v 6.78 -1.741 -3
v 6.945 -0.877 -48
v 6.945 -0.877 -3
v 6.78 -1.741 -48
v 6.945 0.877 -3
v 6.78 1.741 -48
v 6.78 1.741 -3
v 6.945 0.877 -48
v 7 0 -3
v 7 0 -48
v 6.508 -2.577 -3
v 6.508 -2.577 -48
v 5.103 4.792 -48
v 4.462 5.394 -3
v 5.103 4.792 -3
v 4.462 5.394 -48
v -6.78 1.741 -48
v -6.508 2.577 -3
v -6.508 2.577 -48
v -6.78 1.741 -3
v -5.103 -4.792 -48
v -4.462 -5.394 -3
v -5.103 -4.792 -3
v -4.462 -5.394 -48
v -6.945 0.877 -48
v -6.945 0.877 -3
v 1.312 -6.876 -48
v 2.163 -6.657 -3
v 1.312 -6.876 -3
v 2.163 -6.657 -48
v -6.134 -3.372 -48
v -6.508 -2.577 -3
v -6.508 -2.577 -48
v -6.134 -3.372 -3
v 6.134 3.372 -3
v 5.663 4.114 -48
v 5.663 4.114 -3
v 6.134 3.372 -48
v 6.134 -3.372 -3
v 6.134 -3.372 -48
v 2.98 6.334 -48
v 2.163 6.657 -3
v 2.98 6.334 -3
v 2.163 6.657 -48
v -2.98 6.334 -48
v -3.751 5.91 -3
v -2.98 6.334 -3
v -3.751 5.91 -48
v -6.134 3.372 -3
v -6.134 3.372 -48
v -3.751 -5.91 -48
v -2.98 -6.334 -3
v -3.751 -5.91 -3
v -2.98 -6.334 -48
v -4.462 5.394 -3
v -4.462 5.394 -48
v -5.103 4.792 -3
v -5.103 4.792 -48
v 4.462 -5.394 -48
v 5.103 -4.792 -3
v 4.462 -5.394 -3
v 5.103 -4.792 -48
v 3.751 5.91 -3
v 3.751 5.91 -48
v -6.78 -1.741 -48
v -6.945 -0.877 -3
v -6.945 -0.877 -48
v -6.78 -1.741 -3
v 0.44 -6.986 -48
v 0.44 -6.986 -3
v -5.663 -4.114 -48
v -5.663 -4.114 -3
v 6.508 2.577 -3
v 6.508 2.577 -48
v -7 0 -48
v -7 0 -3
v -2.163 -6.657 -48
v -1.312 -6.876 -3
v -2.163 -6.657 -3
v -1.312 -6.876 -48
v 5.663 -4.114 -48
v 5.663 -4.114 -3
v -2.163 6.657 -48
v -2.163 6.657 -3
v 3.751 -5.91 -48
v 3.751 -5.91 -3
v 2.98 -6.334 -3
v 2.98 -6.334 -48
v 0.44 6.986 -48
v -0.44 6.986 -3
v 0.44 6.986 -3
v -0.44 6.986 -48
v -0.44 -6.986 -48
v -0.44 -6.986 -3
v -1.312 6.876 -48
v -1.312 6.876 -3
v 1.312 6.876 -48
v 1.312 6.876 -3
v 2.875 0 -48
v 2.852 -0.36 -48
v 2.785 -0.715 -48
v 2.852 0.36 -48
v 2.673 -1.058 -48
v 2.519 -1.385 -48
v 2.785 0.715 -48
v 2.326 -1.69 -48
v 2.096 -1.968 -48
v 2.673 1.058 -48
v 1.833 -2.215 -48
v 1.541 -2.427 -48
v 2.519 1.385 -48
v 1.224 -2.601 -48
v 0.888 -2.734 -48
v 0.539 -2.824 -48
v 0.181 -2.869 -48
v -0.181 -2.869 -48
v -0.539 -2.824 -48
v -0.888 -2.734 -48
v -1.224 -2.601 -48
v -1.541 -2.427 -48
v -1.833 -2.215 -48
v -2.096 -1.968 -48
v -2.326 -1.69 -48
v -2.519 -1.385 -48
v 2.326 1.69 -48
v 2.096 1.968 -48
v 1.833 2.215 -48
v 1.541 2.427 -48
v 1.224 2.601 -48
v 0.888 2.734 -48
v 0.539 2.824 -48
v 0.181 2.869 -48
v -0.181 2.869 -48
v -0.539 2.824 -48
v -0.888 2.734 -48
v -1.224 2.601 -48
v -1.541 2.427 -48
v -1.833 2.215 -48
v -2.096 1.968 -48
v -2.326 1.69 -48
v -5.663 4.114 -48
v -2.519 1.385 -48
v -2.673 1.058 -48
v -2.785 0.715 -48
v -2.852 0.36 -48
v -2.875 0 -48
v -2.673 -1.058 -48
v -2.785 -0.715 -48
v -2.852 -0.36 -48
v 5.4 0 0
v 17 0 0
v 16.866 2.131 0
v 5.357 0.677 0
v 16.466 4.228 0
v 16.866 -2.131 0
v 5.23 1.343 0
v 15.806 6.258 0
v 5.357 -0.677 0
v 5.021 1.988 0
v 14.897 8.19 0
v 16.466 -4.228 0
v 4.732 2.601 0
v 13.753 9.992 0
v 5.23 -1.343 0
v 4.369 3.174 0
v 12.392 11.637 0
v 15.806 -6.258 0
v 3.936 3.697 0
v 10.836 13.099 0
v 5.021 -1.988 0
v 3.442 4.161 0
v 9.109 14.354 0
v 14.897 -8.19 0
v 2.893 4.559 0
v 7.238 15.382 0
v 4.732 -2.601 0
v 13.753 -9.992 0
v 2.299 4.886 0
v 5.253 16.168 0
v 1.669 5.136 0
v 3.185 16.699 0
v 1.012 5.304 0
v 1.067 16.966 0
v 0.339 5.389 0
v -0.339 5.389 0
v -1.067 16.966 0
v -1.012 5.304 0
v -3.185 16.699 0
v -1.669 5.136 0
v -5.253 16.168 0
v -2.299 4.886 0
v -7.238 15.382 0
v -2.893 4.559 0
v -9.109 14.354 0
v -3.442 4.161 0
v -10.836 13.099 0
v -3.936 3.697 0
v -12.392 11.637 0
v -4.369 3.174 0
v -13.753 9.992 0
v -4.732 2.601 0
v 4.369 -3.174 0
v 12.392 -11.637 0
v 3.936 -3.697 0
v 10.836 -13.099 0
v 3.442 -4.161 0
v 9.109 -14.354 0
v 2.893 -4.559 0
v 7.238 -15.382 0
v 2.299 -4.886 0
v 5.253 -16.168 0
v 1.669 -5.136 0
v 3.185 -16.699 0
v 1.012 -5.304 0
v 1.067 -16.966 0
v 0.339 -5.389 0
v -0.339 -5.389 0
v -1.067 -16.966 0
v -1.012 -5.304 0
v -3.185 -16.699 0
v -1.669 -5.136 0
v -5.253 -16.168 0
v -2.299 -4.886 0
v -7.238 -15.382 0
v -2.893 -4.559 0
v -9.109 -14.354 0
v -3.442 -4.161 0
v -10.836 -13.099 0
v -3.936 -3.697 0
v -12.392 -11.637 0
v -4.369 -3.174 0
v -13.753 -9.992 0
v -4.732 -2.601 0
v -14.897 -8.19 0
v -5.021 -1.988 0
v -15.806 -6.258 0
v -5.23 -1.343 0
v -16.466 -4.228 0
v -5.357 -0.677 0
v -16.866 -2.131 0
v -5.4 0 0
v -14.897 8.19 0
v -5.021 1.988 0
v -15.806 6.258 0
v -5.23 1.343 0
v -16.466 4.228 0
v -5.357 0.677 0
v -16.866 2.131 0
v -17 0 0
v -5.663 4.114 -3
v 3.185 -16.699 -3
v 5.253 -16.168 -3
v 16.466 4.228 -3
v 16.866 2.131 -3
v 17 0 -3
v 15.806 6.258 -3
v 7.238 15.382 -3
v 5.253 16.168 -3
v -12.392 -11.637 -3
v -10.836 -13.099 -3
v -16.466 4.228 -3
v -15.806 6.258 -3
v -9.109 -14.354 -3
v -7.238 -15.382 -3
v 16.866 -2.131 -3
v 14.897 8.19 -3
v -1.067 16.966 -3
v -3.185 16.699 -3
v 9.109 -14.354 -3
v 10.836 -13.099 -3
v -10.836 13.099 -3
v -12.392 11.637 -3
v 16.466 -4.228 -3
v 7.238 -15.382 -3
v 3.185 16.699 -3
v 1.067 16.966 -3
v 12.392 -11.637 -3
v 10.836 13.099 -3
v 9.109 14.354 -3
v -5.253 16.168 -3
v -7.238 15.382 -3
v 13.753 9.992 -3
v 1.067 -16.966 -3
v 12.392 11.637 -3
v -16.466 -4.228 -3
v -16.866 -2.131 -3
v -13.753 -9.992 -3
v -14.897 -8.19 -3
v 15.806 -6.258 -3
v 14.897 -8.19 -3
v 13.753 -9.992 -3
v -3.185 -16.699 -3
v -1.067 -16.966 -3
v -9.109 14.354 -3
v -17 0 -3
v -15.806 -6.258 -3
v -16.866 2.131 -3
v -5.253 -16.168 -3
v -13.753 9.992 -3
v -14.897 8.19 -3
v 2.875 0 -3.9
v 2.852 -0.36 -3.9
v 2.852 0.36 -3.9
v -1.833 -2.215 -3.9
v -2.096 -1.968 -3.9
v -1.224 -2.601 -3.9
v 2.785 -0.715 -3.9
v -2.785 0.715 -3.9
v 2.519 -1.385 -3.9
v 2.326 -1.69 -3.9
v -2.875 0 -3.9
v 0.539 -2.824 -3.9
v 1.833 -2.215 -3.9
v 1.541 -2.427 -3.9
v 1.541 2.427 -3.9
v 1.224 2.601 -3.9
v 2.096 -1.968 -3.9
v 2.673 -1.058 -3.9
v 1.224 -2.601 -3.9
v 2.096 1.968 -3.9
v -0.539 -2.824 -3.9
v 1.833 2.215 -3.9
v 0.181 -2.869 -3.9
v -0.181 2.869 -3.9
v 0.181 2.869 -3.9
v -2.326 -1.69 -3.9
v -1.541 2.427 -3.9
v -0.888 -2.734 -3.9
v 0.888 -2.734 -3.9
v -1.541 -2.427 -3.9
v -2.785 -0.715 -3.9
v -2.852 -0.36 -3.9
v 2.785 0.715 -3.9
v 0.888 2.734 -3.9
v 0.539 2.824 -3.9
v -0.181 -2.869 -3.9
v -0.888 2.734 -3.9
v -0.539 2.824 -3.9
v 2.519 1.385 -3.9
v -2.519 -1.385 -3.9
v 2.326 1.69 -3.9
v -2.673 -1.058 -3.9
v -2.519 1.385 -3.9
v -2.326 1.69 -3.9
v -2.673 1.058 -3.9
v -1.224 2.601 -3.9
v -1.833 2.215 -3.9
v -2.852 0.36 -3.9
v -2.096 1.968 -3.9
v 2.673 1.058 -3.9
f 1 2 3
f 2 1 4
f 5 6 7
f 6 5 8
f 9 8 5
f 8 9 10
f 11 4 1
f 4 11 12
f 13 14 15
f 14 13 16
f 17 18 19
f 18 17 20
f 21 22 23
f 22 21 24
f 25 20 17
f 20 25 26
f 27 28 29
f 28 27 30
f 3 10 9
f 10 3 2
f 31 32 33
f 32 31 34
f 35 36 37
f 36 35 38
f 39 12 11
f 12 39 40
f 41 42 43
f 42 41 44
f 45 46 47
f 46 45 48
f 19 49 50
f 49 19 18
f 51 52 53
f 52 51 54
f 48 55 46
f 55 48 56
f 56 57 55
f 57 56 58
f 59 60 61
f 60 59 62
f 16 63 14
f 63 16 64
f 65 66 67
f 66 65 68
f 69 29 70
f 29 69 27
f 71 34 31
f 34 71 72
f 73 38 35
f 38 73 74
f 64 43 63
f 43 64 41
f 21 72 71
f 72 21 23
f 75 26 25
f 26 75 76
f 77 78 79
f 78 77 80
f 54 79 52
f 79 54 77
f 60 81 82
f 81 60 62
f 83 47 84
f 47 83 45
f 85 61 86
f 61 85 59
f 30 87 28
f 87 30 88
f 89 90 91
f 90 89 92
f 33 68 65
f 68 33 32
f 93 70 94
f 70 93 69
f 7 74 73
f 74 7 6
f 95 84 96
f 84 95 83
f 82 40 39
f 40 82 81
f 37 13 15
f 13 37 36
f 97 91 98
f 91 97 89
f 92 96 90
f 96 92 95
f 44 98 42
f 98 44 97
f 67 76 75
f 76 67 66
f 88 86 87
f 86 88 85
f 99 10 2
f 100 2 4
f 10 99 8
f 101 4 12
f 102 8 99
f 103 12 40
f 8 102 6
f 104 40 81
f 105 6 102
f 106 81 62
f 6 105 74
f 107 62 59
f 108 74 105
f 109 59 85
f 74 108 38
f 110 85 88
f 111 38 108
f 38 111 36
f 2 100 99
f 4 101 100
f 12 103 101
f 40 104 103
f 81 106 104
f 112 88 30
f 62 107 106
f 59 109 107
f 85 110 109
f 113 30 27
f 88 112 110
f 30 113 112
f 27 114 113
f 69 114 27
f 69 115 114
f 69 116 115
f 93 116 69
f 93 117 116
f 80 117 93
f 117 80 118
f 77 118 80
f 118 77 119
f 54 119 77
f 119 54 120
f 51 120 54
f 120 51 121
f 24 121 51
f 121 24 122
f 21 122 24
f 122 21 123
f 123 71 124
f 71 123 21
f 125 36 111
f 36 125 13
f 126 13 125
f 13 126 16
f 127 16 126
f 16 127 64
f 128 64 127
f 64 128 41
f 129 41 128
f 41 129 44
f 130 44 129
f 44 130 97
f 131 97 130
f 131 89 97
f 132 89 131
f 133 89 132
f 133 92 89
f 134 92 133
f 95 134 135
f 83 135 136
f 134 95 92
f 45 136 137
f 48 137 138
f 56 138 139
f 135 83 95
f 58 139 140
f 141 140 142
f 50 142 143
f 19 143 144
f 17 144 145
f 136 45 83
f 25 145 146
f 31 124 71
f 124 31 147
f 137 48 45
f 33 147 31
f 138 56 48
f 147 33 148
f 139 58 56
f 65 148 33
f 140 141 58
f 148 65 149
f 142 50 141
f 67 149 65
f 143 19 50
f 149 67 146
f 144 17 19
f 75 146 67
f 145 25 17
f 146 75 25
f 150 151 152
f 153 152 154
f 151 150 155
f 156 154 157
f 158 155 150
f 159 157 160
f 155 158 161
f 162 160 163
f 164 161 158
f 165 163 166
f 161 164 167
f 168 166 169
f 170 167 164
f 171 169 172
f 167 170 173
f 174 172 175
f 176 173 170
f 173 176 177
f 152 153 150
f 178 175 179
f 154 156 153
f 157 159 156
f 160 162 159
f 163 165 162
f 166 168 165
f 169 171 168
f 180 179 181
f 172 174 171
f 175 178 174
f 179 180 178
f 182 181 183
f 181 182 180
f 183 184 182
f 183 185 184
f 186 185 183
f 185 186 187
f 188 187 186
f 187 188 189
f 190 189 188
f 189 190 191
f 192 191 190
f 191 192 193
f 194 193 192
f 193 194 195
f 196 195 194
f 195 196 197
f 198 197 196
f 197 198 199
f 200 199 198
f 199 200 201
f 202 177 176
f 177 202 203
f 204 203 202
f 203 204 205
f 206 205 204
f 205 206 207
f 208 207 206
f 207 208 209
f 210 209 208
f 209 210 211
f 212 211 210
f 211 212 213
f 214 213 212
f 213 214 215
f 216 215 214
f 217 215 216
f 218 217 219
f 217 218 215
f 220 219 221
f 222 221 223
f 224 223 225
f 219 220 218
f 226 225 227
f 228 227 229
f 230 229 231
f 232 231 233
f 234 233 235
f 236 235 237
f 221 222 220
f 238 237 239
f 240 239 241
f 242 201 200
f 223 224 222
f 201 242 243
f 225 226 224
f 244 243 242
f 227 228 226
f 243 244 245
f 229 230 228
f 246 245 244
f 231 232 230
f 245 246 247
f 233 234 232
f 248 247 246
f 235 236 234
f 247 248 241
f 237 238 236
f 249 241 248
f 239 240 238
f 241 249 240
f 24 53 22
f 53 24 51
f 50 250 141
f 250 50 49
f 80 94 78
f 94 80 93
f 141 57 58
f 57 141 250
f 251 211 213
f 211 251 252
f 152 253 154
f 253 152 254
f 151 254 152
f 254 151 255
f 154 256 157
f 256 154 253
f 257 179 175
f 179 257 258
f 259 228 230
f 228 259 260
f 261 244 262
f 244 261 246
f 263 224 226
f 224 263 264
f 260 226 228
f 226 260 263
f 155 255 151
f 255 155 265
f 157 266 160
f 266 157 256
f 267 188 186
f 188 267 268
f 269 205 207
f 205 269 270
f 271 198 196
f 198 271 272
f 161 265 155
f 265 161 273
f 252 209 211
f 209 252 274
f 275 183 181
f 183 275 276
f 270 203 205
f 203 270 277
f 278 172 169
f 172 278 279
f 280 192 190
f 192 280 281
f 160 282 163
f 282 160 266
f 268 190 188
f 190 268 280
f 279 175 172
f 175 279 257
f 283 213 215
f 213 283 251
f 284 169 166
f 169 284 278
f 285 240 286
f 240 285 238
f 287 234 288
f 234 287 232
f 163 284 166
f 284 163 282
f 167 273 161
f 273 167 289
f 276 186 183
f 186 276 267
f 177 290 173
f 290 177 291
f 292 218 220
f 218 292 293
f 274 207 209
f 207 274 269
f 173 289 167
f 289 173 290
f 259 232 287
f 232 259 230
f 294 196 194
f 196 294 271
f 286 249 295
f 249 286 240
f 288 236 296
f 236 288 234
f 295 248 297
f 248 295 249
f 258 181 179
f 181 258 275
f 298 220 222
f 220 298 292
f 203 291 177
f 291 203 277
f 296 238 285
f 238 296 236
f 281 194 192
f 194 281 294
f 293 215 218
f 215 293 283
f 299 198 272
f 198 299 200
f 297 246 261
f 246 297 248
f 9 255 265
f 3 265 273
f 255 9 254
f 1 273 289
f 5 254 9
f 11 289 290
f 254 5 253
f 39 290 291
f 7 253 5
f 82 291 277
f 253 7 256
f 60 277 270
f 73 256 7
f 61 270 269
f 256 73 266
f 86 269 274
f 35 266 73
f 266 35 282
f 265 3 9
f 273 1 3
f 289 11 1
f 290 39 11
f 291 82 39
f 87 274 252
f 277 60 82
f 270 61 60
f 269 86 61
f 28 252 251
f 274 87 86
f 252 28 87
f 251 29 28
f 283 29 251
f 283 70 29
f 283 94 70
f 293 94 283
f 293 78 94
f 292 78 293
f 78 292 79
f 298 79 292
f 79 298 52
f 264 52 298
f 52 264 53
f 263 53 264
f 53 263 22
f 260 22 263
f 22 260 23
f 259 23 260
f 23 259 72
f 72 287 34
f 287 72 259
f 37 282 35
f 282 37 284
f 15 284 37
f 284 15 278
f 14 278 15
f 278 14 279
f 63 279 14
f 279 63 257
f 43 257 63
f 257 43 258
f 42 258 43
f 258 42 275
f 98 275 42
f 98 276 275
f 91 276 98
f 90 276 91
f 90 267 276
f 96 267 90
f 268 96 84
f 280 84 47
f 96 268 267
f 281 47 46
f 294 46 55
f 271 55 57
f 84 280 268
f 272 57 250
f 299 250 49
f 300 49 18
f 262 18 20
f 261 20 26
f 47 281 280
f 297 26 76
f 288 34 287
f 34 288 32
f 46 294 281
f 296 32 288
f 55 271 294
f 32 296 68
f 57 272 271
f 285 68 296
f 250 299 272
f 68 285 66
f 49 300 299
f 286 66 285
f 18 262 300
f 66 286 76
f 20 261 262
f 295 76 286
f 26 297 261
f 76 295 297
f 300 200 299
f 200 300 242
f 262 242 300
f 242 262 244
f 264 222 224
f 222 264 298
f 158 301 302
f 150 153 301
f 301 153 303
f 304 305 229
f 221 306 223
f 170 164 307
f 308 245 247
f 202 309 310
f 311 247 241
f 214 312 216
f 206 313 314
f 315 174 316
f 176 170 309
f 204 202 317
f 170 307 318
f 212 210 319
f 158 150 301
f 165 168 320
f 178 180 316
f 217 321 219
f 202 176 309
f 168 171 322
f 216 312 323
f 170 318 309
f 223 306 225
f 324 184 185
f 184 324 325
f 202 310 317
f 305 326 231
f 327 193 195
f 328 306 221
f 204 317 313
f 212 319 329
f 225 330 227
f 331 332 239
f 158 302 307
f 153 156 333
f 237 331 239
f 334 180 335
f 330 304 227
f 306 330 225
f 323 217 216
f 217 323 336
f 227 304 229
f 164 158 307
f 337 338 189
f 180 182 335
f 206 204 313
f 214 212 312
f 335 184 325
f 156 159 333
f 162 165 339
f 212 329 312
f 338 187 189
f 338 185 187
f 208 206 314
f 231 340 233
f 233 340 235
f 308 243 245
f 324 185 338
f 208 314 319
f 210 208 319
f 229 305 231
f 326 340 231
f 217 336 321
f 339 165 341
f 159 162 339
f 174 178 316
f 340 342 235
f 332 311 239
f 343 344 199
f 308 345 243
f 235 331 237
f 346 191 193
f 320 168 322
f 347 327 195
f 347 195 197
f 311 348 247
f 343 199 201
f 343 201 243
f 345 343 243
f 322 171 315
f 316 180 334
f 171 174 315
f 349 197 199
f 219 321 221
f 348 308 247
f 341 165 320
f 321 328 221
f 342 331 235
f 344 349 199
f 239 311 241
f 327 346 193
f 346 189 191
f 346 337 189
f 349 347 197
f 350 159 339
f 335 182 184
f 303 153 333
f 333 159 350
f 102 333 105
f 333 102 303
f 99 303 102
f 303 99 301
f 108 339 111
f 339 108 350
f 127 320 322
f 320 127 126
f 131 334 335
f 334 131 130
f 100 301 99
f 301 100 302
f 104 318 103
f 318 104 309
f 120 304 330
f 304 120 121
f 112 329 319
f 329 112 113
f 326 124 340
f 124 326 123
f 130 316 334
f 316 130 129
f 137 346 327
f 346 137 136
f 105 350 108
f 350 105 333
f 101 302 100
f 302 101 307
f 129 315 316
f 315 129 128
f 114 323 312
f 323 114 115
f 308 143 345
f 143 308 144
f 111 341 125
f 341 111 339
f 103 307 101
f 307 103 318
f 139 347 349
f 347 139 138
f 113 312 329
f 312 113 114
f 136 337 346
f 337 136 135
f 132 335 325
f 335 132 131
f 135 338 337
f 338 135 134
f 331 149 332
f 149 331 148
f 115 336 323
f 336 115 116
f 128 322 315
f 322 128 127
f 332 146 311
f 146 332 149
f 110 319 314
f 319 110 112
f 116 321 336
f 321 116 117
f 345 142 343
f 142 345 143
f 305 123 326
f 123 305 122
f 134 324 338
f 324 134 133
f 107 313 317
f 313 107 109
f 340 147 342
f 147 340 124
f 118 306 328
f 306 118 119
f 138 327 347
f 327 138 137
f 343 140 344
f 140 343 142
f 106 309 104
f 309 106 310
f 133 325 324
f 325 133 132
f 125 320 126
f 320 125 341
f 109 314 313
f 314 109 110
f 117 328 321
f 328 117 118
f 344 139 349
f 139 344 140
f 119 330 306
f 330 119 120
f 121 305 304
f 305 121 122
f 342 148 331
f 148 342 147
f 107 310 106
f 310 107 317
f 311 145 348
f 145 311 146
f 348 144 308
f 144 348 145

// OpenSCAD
$fn = 50;


difference() {
	union() {
		translate(v = [0, 0, -48.0000000000]) {
			cylinder(h = 48, r = 7.0000000000);
		}
		translate(v = [0, 0, -3.0000000000]) {
			cylinder(h = 3, r = 17.0000000000);
		}
	}
	union() {
		translate(v = [0, 0, 0]) {
			rotate(a = [0, 0, 0]) {
				difference() {
					union() {
						#translate(v = [0, 0, -48.0000000000]) {
							cylinder(h = 48, r = 2.6000000000);
						}
						#translate(v = [0, 0, -3.9000000000]) {
							cylinder(h = 3.9000000000, r = 7.0000000000, r1 = 2.8750000000, r2 = 5.4000000000);
						}
						#translate(v = [0, 0, -48.0000000000]) {
							cylinder(h = 48, r = 2.8750000000);
						}
						#translate(v = [0, 0, -48.0000000000]) {
							cylinder(h = 48, r = 2.6000000000);
						}
					}
					union();
				}
			}
		}
	}
}
